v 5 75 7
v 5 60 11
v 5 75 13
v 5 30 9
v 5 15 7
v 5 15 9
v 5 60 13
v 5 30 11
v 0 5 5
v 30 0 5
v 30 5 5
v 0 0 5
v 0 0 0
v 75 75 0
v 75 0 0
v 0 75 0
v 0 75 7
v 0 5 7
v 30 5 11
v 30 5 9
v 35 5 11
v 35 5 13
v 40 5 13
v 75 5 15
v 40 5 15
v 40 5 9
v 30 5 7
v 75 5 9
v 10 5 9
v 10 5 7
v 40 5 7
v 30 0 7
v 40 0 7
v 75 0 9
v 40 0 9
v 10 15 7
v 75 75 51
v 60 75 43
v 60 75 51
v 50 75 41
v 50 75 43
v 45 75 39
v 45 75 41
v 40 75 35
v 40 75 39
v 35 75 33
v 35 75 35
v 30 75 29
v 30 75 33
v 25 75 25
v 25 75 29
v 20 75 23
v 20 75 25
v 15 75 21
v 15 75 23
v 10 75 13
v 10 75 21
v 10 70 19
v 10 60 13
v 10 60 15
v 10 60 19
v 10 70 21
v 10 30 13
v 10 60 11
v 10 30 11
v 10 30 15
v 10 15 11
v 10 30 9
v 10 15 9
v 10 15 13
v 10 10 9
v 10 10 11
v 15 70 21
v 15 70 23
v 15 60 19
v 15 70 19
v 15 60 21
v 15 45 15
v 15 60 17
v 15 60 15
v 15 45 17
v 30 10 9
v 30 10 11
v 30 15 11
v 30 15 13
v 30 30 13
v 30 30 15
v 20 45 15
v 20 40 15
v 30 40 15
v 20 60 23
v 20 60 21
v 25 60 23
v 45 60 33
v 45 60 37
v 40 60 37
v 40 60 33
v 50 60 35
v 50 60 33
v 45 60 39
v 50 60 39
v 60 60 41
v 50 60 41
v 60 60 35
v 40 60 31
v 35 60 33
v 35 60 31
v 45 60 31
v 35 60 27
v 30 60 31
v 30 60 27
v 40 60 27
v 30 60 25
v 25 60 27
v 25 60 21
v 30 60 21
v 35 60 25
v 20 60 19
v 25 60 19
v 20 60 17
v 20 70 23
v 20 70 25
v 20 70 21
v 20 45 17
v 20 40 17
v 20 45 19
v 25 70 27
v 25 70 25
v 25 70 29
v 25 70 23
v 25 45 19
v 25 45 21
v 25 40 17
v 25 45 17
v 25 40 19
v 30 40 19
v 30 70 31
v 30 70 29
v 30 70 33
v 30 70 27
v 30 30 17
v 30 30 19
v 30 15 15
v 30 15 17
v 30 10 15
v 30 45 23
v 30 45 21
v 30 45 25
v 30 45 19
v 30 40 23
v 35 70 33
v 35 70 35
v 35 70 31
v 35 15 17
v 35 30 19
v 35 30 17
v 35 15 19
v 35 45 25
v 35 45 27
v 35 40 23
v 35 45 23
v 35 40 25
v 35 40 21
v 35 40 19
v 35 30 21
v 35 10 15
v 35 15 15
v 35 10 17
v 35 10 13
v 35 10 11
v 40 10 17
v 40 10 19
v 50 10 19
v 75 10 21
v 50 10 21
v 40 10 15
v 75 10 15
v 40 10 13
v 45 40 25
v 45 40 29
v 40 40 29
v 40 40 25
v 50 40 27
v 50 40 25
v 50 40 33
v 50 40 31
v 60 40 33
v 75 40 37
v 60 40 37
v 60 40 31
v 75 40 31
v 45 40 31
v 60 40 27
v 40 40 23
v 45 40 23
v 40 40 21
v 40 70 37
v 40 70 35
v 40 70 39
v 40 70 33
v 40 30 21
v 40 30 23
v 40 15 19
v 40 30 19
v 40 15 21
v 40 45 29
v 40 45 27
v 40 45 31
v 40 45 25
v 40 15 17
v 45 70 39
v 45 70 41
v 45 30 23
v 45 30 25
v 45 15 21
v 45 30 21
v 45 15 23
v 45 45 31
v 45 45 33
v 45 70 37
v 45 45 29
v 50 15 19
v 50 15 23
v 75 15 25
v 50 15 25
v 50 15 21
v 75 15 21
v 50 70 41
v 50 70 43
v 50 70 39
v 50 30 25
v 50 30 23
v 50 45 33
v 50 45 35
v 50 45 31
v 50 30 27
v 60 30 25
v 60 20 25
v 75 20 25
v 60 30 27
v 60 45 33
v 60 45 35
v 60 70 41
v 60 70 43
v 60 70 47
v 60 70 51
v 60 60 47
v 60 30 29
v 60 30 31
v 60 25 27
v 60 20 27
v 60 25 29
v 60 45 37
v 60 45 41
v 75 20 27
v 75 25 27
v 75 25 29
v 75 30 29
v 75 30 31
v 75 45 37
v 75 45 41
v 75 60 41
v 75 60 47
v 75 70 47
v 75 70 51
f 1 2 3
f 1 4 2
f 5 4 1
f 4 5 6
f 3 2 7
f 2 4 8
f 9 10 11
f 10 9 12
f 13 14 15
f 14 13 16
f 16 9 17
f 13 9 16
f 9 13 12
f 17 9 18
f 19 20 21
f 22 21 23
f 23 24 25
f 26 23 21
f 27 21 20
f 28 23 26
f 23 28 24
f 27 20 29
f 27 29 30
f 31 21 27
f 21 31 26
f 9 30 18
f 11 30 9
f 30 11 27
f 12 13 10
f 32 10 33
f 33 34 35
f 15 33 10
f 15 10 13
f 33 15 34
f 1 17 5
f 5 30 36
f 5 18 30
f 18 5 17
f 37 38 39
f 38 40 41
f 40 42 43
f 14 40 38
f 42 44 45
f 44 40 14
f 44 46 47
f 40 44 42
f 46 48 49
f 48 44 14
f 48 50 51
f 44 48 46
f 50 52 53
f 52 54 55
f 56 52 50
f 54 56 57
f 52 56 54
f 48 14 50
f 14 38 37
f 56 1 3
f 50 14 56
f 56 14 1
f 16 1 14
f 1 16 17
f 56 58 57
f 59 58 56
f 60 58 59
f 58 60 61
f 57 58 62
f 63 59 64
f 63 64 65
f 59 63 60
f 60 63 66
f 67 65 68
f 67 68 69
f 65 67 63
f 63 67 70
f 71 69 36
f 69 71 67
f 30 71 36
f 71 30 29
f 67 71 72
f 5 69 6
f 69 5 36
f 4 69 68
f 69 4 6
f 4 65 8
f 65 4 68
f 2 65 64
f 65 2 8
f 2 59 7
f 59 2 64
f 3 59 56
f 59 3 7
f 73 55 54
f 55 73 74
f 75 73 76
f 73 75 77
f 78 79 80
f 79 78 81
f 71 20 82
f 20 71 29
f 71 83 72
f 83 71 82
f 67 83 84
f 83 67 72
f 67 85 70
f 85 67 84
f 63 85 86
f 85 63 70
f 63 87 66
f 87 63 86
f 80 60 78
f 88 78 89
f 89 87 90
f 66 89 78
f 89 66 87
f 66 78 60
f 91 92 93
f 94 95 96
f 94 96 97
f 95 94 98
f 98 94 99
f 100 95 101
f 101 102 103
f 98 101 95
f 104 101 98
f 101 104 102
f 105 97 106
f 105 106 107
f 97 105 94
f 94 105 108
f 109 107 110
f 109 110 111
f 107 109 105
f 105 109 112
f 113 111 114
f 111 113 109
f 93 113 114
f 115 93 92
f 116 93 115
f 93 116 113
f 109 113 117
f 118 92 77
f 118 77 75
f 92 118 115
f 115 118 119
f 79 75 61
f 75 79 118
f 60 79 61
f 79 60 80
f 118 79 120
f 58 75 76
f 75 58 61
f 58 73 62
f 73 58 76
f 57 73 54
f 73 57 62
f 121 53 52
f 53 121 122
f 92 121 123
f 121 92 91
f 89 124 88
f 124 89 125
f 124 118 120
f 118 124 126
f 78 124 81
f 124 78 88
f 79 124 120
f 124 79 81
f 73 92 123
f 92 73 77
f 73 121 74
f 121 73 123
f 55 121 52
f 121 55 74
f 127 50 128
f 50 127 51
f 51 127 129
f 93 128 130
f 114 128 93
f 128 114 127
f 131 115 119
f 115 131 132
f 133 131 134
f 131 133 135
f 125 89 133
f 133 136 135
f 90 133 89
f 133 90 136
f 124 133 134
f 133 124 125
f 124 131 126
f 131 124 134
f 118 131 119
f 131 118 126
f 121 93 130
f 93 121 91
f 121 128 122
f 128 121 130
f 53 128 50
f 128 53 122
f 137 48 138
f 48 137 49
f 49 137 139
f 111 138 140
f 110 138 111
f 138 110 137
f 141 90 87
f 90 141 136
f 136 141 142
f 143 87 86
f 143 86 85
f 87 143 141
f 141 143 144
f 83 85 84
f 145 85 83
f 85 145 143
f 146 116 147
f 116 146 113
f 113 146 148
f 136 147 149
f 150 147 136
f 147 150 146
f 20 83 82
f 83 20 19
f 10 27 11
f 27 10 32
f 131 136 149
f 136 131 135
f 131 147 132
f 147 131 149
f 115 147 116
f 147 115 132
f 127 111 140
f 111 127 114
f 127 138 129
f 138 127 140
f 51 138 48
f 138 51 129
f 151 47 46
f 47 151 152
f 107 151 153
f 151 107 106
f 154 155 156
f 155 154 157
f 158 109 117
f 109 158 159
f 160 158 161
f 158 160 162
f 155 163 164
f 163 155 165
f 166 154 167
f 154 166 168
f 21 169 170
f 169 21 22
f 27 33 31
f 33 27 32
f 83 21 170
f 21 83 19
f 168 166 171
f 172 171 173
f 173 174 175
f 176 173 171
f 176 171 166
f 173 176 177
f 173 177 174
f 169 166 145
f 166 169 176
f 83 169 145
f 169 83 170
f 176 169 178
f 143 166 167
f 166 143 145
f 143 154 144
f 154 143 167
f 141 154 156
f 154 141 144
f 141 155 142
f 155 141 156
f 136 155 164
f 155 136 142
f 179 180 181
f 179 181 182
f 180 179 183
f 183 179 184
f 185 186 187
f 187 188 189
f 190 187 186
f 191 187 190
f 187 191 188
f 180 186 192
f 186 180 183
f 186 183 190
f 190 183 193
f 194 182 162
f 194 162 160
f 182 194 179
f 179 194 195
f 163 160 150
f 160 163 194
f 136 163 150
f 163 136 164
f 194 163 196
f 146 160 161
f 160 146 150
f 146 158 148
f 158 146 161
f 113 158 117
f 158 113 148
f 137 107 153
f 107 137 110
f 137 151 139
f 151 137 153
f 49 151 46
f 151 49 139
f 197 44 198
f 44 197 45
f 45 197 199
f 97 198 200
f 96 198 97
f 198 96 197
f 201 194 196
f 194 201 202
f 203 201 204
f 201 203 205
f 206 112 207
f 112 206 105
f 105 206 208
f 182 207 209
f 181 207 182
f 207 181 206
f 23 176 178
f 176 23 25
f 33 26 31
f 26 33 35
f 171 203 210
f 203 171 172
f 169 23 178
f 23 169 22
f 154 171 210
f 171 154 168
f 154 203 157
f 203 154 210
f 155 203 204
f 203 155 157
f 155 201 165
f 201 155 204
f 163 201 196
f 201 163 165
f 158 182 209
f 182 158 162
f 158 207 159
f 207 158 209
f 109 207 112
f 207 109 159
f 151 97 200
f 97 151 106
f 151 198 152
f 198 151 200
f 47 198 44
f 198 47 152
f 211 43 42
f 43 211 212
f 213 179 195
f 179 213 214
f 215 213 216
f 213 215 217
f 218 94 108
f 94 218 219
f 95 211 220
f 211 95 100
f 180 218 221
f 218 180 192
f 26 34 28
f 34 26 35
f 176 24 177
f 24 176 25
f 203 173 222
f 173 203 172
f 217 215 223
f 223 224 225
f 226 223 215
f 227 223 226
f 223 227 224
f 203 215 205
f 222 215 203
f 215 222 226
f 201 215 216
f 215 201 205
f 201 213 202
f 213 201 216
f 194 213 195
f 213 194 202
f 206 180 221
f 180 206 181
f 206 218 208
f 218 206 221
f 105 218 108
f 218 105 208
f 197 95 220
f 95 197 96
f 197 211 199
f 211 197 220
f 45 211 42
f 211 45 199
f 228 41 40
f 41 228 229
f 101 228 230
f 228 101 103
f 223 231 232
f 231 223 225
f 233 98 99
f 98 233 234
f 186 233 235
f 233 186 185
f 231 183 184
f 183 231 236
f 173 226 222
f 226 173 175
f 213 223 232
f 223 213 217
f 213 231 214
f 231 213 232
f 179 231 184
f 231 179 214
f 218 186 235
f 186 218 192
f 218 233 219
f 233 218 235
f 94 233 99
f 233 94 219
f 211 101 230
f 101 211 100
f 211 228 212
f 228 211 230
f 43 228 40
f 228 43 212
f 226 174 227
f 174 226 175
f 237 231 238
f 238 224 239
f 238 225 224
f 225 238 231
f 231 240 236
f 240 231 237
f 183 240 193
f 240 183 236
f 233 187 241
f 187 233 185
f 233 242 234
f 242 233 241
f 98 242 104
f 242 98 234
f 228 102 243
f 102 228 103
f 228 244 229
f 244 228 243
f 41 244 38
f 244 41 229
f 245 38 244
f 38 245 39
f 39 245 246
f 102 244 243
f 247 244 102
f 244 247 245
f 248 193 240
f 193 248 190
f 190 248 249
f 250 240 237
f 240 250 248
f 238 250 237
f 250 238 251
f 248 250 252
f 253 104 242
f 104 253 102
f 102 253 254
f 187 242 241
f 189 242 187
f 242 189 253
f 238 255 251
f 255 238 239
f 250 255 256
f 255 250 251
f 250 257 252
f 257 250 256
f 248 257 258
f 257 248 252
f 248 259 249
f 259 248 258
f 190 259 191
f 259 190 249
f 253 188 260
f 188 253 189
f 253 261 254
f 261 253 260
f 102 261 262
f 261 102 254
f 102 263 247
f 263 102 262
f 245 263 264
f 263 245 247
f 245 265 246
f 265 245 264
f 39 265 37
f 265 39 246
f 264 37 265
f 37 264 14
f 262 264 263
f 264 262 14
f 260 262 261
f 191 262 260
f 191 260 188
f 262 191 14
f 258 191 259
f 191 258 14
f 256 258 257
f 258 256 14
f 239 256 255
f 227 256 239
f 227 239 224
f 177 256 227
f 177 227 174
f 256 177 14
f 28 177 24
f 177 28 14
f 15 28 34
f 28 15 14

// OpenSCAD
function random_binary(n,threshold) =
  [for (r = rands(0,1,n))
     r < threshold ? 0 : 1
  ];
  
function cumulative_vector(v,vc=[],i=0) =
    i <len(v)
     ? let (ns = i==0 ? v[i] : vc[i-1]+v[i])
       cumulative_vector(v,concat(vc,ns),i+1)
     : vc;
    
function cumulative_matrix (n,threshold,m=[],i=0) =
   i <n
      ? let (ir = random_binary(n,threshold[i]),
             cir = cumulative_vector(ir),
             mn = i==0 ? cir : m[i-1]+cir)
       cumulative_matrix(n,threshold,concat(m,[mn]),i+1)
      : m;
  
module positive (m,n,d,base,vscale) {
 for (i=[0:n-1])
    for (j=[0:n-1])
        translate([i*d,j*d,0])
           cube([d,d,base+vscale*m[i][j]]);
  
}

n=15;
//thrshold is eased so later sequeces are closer to zero - arbitrary 

threshold=[for (i=[0:n-1]) 0.85 + i/n/8]; 
echo(threshold);  
d=5; 
vscale=2; 
base=5; 

m =cumulative_matrix(n,threshold);
echo (m);
positive(m,n,d,base,vscale);
